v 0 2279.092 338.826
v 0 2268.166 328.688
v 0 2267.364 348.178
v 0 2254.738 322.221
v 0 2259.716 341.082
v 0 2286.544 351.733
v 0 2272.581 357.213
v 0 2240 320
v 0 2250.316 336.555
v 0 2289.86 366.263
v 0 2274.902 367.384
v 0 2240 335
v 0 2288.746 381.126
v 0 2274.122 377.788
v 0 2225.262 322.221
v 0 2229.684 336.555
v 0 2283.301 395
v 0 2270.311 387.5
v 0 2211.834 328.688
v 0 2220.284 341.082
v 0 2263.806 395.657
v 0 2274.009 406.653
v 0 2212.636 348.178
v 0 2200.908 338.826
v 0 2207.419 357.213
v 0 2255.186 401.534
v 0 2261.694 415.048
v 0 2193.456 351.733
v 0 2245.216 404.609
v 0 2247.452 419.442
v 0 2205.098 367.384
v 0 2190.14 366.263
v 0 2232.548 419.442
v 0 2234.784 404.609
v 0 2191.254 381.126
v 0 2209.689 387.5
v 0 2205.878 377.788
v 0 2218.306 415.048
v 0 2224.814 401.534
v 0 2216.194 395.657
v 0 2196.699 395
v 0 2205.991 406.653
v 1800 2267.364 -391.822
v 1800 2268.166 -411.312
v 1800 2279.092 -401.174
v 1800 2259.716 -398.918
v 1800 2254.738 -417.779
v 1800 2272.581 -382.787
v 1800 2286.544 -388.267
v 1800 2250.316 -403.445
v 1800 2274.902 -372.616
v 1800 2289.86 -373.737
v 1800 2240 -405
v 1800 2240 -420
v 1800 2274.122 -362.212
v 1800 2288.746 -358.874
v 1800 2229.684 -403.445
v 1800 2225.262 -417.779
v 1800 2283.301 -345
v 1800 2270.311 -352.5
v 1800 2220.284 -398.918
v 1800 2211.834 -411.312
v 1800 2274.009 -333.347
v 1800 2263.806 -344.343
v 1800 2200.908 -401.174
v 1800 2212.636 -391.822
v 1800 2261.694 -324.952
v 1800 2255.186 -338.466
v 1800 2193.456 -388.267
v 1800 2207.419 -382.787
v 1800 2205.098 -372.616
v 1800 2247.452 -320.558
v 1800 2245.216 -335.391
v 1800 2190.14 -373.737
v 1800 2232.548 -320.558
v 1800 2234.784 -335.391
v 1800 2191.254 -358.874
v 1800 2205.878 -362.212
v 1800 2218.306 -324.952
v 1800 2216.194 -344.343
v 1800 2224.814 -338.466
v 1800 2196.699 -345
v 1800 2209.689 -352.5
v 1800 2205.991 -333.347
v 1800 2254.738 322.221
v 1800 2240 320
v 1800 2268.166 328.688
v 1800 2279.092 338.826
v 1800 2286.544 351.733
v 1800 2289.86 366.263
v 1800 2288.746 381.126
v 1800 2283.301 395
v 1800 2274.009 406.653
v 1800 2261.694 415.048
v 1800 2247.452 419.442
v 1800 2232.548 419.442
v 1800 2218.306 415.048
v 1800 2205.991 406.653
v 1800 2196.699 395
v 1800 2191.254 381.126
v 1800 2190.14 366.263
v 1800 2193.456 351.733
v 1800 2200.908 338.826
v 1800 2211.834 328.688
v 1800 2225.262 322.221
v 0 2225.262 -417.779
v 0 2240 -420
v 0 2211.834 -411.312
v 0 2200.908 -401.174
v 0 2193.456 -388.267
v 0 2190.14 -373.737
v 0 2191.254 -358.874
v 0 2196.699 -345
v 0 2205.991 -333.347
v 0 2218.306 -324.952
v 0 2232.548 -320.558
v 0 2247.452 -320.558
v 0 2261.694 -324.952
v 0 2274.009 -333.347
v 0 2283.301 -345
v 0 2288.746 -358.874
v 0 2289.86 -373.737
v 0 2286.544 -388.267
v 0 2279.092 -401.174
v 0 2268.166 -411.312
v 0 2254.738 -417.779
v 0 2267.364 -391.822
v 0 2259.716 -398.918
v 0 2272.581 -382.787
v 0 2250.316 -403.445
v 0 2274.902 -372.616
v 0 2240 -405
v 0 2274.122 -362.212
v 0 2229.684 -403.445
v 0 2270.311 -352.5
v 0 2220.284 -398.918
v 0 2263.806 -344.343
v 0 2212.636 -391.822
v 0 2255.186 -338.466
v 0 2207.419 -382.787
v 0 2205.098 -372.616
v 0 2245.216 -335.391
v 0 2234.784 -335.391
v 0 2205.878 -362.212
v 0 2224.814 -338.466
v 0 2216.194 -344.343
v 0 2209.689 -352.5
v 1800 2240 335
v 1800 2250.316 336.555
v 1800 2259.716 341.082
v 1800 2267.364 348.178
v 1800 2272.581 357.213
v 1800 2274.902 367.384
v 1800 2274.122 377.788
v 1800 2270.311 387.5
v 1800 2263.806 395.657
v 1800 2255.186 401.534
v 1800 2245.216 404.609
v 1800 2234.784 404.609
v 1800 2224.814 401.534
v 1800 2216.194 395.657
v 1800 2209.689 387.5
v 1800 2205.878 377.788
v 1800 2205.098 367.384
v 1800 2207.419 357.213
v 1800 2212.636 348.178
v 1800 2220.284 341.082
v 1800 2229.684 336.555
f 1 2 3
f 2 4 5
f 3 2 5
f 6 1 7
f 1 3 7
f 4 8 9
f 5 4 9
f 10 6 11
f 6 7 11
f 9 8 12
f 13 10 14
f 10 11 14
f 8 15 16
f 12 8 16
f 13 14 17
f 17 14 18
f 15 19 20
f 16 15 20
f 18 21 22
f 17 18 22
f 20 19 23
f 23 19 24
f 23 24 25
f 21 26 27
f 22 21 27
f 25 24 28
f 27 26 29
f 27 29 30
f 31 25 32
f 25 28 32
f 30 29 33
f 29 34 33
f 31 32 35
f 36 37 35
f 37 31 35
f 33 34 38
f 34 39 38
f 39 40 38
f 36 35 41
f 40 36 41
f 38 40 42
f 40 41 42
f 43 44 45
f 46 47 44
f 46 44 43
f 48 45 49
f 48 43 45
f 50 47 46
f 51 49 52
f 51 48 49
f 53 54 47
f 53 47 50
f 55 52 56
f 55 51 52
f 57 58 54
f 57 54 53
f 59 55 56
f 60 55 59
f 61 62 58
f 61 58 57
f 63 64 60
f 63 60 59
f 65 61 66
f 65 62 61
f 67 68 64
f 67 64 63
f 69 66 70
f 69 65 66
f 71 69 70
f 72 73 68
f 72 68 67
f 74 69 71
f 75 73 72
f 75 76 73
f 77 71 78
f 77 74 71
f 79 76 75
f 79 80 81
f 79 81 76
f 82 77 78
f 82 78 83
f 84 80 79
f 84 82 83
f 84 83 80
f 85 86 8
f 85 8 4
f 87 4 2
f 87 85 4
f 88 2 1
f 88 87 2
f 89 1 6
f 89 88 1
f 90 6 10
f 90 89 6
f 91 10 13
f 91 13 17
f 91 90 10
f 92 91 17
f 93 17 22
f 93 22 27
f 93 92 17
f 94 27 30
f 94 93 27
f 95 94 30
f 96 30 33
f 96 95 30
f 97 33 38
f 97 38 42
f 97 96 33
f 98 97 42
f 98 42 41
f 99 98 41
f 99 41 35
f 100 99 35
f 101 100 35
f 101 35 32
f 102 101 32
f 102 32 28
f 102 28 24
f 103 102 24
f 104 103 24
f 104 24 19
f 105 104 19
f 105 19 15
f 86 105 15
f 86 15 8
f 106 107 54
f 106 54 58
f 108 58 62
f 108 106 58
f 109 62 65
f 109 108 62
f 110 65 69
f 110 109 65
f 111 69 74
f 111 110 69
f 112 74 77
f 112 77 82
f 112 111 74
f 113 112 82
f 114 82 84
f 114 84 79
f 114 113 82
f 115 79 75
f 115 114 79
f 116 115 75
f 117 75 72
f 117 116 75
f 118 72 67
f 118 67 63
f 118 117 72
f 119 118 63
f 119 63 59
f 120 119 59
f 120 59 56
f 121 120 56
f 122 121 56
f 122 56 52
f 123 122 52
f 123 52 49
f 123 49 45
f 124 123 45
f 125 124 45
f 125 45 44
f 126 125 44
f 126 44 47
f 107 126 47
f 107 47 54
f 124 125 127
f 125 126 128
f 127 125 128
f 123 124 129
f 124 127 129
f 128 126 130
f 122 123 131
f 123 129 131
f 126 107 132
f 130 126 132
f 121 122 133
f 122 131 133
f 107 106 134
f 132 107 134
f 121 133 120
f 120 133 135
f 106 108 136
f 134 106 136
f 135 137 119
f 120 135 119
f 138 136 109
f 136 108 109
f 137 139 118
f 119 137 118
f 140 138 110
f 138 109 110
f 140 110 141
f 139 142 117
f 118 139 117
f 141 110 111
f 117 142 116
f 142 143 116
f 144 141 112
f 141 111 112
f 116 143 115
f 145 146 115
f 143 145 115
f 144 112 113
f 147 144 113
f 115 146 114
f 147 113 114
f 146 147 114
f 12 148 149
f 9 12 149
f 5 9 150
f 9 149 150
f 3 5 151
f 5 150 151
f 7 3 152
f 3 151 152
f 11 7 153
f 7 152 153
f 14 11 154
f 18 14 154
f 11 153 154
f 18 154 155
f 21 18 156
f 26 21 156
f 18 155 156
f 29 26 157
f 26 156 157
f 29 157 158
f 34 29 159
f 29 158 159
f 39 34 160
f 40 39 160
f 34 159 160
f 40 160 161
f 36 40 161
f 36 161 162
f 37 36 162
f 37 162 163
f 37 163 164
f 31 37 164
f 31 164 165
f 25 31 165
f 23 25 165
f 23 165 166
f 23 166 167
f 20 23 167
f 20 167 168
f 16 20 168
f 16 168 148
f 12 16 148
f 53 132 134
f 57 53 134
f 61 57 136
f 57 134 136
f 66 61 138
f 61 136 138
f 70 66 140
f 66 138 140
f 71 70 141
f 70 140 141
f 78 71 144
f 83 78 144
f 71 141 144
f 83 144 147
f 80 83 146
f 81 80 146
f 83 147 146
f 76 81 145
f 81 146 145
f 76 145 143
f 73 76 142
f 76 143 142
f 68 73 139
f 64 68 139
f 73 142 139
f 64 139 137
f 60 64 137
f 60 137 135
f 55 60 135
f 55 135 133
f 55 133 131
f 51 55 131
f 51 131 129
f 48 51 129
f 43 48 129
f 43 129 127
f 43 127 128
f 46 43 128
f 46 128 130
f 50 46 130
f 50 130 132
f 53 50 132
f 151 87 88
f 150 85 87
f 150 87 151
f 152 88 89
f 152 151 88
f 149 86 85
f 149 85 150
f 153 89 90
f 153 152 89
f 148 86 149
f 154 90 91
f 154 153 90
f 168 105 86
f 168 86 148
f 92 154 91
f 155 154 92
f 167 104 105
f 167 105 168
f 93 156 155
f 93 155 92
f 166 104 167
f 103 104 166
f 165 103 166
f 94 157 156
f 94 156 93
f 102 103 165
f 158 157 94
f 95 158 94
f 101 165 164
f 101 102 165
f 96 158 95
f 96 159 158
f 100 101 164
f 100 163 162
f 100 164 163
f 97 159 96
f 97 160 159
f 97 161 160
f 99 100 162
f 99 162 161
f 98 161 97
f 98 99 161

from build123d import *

# Parameters (mm, degrees)
SKETCH11_R   = 50
SKETCH11_R_2 = 35
SKETCH12_R   = 50
SKETCH12_R_2 = 35


with BuildPart() as part:
    # MemberTL: sweep along a path in Sketch7
    with BuildLine(Plane(origin=(0, 2240, 0), x_dir=(-1, 0, 0), z_dir=(0, -1, 0))) as membertl_path:
        Line((-1800, 370), (0, 370))
    # Sketch11 → MemberTL (sweep)
    with BuildSketch(Plane(origin=(0, 0, 0), x_dir=(0, 0, -1), z_dir=(1, 0, 0))):
        with Locations((370, 2240)):
            Circle(SKETCH11_R)
        with Locations((370, 2240)):
            Circle(SKETCH11_R_2, mode=Mode.SUBTRACT)
    sweep(path=membertl_path.line)


with BuildPart() as body_2:
    # MemberTR: sweep along a path in Sketch13
    with BuildLine(Plane(origin=(0, 2240, 0), x_dir=(-1, 0, 0), z_dir=(0, -1, 0))) as membertr_path:
        Line((0, -370), (-1800, -370))
    # Sketch12 → MemberTR (sweep)
    with BuildSketch(Plane(origin=(0, 0, 0), x_dir=(0, 0, -1), z_dir=(1, 0, 0))):
        with Locations((-370, 2240)):
            Circle(SKETCH12_R)
        with Locations((-370, 2240)):
            Circle(SKETCH12_R_2, mode=Mode.SUBTRACT)
    sweep(path=membertr_path.line)


solid = Compound([part.part, body_2.part])
